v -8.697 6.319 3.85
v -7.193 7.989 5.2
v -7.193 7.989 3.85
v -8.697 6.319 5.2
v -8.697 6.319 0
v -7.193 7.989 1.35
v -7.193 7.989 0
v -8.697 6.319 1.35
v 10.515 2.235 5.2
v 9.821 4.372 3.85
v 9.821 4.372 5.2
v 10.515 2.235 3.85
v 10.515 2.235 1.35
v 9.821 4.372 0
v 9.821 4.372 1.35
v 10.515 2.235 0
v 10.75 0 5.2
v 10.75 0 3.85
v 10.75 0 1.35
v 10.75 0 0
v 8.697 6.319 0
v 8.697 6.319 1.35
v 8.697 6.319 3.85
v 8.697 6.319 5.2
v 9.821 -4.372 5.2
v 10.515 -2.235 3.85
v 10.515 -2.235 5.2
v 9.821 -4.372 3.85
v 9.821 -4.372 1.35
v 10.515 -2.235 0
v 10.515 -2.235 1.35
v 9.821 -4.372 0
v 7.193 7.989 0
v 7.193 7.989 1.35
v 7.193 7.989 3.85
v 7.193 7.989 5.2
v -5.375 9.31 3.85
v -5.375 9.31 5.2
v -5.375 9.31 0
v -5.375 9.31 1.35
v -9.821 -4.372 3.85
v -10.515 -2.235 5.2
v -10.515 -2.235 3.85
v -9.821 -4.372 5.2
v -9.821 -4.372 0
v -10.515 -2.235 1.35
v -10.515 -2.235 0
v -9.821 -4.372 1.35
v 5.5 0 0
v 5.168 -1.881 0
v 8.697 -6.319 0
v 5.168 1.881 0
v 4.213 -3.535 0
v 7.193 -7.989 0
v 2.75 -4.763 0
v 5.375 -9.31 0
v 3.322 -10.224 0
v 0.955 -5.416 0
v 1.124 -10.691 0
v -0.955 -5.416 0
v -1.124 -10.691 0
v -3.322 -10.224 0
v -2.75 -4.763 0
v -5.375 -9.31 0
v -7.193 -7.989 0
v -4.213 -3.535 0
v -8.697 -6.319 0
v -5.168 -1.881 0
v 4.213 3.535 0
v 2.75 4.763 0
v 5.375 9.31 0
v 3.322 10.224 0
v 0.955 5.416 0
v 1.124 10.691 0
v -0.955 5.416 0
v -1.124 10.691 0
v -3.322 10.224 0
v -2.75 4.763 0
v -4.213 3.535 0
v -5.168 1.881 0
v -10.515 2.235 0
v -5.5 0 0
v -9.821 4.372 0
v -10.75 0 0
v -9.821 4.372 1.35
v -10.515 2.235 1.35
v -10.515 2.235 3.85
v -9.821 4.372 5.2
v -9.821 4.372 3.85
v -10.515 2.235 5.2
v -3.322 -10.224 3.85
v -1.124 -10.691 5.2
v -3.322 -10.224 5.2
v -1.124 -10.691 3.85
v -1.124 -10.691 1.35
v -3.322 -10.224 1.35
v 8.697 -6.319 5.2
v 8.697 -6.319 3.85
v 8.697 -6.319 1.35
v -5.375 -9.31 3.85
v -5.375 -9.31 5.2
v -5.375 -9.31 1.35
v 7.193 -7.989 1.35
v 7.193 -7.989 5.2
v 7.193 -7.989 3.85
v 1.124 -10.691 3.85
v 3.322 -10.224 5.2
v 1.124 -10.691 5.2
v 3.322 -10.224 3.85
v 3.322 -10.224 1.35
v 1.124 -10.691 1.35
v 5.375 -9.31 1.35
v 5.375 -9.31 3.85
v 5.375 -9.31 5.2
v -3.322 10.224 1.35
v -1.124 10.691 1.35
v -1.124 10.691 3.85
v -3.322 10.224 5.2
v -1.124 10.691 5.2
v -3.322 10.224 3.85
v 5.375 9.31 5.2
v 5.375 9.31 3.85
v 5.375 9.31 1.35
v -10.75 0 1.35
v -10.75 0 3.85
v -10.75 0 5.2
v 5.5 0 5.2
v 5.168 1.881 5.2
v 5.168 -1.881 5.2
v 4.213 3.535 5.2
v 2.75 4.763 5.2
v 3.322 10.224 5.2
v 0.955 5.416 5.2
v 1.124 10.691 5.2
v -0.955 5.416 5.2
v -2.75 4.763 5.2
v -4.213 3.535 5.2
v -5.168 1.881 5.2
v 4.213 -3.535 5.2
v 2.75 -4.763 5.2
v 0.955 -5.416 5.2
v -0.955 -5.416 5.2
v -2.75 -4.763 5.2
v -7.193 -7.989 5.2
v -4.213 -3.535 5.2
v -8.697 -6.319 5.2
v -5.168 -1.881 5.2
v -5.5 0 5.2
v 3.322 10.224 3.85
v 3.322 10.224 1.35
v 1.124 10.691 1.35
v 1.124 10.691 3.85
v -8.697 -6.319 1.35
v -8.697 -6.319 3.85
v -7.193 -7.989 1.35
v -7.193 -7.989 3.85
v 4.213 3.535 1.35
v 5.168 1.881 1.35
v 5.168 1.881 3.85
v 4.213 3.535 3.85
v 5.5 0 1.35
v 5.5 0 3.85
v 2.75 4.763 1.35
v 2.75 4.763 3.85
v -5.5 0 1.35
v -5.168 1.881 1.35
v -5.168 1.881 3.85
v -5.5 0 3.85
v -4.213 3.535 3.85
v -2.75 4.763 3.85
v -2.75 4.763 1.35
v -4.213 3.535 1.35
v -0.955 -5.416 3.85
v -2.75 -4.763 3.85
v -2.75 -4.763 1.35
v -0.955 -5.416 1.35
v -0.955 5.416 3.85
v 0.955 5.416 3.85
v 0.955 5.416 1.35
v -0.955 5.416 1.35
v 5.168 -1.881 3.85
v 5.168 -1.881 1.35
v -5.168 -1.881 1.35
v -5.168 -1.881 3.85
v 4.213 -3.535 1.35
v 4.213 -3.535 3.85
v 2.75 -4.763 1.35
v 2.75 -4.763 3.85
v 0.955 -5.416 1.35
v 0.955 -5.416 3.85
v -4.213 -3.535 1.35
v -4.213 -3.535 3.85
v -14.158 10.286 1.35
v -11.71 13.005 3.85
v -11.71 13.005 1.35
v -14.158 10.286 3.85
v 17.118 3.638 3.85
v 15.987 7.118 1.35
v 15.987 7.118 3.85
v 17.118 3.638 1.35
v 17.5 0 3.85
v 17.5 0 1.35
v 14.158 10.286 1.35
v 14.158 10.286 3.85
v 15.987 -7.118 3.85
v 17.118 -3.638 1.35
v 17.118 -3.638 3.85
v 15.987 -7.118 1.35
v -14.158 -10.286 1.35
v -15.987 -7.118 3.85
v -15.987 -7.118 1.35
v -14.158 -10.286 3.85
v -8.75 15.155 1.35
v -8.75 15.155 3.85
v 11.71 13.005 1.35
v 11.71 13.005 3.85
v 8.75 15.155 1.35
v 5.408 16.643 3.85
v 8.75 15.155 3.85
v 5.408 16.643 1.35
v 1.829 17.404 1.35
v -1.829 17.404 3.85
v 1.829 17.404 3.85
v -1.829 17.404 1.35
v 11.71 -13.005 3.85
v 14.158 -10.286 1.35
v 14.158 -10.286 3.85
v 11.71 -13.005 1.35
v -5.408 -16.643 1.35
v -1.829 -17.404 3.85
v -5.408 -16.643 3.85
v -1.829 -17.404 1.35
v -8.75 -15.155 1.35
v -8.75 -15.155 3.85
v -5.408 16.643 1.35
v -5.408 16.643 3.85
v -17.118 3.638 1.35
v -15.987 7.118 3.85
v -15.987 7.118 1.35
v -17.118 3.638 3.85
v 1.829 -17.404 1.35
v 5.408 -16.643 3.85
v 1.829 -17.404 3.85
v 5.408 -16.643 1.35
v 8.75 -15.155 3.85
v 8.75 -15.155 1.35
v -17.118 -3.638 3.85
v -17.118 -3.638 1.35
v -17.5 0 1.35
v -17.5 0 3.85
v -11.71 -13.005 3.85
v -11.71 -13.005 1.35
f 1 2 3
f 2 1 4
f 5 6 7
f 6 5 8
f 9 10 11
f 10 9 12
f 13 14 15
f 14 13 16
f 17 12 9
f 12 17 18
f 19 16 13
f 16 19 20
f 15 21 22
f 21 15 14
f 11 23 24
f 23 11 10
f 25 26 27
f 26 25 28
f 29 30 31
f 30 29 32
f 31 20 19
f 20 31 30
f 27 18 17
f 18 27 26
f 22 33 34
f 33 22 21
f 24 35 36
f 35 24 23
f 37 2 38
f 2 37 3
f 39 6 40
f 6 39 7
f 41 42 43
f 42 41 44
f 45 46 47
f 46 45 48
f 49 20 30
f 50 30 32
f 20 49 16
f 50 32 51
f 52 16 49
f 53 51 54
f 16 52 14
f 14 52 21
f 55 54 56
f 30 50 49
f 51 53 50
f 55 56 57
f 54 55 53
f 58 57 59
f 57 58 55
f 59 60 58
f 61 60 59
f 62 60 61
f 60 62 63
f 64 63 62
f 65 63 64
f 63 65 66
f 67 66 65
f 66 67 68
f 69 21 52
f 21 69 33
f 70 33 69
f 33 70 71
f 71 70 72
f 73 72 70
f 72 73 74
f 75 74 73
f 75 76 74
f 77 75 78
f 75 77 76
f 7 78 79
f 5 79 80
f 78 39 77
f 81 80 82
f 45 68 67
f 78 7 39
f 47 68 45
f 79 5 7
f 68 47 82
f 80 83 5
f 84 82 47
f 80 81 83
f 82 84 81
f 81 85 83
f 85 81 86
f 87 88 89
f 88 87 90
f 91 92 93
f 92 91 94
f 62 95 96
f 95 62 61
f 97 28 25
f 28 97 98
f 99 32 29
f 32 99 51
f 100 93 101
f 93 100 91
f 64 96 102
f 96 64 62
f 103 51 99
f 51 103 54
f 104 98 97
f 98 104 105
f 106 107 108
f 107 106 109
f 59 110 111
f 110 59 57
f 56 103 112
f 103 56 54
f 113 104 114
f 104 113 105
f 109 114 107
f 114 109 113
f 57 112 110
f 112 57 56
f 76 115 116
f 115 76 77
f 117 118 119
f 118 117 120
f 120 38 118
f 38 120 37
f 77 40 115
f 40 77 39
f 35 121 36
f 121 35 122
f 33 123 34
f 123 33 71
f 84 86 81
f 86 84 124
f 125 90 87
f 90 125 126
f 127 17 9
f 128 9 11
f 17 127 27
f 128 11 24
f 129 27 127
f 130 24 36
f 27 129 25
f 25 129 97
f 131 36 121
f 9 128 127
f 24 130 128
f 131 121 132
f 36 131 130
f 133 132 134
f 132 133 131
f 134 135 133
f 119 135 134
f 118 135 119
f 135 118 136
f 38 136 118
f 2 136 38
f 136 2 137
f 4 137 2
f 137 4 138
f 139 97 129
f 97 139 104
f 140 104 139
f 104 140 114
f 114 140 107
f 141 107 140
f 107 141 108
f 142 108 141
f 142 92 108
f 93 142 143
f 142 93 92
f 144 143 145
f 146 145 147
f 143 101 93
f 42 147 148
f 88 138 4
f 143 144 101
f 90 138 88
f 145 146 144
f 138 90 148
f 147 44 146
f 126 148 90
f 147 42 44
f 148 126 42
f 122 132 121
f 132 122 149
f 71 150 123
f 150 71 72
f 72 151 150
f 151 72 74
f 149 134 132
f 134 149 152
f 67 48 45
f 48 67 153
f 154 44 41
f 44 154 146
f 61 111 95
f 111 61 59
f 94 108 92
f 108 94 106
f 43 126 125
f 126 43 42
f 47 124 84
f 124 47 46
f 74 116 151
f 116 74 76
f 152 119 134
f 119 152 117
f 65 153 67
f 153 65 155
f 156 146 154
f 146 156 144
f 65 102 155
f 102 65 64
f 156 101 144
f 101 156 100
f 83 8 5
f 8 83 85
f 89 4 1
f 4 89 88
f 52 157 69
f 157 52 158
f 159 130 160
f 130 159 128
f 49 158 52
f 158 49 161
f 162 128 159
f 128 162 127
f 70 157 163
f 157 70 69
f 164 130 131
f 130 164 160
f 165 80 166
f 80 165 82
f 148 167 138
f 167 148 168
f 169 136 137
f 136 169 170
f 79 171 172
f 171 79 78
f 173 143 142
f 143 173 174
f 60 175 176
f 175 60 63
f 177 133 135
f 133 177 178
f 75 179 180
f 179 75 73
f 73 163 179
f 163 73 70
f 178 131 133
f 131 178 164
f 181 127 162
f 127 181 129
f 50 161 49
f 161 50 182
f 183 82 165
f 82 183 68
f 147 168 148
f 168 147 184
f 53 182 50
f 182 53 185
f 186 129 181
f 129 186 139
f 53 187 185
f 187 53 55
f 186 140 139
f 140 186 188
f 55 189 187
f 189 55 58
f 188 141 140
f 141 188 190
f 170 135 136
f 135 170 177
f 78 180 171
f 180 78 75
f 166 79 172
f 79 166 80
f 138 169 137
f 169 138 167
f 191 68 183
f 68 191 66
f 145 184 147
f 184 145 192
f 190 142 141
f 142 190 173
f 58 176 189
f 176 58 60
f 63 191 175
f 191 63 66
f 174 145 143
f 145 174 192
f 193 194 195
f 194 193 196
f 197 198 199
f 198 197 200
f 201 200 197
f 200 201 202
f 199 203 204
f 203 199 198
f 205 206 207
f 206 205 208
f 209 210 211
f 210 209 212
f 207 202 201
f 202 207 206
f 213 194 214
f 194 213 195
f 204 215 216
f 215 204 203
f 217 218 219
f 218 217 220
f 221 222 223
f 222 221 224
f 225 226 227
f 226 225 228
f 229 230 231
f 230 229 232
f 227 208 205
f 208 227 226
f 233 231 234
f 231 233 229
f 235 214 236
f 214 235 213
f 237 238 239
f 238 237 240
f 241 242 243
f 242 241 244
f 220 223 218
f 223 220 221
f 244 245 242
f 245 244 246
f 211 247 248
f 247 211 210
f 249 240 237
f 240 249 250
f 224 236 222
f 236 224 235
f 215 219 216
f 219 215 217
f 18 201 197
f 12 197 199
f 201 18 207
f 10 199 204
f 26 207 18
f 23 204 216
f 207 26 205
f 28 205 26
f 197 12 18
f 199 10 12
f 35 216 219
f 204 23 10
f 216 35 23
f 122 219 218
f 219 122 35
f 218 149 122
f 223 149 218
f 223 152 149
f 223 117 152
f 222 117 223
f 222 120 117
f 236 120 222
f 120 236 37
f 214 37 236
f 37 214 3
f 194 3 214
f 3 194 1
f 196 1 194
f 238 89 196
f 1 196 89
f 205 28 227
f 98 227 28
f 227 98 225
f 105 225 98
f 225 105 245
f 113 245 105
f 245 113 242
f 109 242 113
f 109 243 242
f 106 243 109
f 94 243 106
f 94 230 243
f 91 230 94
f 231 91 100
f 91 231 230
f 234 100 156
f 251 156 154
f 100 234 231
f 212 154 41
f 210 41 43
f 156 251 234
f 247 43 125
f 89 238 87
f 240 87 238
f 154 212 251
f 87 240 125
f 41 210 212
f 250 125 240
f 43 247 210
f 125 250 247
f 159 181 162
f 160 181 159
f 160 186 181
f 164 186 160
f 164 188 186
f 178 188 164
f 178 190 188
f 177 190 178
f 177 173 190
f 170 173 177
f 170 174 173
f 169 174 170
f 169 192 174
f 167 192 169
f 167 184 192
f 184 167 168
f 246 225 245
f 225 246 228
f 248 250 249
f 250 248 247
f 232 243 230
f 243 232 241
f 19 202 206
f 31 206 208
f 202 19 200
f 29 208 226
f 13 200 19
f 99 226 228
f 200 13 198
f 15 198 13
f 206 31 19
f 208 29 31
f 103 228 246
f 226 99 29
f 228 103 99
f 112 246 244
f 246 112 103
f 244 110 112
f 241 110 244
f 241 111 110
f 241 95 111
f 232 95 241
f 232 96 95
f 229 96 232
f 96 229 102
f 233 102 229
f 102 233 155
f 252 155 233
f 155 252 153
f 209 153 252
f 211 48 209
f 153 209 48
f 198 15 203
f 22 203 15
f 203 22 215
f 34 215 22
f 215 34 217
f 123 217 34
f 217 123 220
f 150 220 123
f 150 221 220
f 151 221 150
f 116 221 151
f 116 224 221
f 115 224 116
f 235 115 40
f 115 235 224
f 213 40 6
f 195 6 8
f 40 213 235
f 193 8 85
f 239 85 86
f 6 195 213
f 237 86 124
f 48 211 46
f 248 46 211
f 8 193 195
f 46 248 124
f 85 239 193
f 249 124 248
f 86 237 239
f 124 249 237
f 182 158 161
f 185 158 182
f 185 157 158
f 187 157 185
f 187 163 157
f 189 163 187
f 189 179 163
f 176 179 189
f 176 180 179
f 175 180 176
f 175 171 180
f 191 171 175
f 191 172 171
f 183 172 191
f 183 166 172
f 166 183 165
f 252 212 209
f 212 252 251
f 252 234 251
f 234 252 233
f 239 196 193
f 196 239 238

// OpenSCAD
// diameter of the coin ("pancake")
A=35.0;

// outer diameter of the ring
B=21.5;

// inner diameter of the ring
C=11.0;

// thickness of the "pancake"
D=2.5;

// total thickness of the coin, including rings
E=5.2;

union() {

	difference() {
		cylinder( h = E, r = B/2 );
		cylinder( h = E, r = C/2 );
	}
	
	translate( [ 0, 0, E/2 ] ) cylinder( h = D, r = A/2, center = true );

}
